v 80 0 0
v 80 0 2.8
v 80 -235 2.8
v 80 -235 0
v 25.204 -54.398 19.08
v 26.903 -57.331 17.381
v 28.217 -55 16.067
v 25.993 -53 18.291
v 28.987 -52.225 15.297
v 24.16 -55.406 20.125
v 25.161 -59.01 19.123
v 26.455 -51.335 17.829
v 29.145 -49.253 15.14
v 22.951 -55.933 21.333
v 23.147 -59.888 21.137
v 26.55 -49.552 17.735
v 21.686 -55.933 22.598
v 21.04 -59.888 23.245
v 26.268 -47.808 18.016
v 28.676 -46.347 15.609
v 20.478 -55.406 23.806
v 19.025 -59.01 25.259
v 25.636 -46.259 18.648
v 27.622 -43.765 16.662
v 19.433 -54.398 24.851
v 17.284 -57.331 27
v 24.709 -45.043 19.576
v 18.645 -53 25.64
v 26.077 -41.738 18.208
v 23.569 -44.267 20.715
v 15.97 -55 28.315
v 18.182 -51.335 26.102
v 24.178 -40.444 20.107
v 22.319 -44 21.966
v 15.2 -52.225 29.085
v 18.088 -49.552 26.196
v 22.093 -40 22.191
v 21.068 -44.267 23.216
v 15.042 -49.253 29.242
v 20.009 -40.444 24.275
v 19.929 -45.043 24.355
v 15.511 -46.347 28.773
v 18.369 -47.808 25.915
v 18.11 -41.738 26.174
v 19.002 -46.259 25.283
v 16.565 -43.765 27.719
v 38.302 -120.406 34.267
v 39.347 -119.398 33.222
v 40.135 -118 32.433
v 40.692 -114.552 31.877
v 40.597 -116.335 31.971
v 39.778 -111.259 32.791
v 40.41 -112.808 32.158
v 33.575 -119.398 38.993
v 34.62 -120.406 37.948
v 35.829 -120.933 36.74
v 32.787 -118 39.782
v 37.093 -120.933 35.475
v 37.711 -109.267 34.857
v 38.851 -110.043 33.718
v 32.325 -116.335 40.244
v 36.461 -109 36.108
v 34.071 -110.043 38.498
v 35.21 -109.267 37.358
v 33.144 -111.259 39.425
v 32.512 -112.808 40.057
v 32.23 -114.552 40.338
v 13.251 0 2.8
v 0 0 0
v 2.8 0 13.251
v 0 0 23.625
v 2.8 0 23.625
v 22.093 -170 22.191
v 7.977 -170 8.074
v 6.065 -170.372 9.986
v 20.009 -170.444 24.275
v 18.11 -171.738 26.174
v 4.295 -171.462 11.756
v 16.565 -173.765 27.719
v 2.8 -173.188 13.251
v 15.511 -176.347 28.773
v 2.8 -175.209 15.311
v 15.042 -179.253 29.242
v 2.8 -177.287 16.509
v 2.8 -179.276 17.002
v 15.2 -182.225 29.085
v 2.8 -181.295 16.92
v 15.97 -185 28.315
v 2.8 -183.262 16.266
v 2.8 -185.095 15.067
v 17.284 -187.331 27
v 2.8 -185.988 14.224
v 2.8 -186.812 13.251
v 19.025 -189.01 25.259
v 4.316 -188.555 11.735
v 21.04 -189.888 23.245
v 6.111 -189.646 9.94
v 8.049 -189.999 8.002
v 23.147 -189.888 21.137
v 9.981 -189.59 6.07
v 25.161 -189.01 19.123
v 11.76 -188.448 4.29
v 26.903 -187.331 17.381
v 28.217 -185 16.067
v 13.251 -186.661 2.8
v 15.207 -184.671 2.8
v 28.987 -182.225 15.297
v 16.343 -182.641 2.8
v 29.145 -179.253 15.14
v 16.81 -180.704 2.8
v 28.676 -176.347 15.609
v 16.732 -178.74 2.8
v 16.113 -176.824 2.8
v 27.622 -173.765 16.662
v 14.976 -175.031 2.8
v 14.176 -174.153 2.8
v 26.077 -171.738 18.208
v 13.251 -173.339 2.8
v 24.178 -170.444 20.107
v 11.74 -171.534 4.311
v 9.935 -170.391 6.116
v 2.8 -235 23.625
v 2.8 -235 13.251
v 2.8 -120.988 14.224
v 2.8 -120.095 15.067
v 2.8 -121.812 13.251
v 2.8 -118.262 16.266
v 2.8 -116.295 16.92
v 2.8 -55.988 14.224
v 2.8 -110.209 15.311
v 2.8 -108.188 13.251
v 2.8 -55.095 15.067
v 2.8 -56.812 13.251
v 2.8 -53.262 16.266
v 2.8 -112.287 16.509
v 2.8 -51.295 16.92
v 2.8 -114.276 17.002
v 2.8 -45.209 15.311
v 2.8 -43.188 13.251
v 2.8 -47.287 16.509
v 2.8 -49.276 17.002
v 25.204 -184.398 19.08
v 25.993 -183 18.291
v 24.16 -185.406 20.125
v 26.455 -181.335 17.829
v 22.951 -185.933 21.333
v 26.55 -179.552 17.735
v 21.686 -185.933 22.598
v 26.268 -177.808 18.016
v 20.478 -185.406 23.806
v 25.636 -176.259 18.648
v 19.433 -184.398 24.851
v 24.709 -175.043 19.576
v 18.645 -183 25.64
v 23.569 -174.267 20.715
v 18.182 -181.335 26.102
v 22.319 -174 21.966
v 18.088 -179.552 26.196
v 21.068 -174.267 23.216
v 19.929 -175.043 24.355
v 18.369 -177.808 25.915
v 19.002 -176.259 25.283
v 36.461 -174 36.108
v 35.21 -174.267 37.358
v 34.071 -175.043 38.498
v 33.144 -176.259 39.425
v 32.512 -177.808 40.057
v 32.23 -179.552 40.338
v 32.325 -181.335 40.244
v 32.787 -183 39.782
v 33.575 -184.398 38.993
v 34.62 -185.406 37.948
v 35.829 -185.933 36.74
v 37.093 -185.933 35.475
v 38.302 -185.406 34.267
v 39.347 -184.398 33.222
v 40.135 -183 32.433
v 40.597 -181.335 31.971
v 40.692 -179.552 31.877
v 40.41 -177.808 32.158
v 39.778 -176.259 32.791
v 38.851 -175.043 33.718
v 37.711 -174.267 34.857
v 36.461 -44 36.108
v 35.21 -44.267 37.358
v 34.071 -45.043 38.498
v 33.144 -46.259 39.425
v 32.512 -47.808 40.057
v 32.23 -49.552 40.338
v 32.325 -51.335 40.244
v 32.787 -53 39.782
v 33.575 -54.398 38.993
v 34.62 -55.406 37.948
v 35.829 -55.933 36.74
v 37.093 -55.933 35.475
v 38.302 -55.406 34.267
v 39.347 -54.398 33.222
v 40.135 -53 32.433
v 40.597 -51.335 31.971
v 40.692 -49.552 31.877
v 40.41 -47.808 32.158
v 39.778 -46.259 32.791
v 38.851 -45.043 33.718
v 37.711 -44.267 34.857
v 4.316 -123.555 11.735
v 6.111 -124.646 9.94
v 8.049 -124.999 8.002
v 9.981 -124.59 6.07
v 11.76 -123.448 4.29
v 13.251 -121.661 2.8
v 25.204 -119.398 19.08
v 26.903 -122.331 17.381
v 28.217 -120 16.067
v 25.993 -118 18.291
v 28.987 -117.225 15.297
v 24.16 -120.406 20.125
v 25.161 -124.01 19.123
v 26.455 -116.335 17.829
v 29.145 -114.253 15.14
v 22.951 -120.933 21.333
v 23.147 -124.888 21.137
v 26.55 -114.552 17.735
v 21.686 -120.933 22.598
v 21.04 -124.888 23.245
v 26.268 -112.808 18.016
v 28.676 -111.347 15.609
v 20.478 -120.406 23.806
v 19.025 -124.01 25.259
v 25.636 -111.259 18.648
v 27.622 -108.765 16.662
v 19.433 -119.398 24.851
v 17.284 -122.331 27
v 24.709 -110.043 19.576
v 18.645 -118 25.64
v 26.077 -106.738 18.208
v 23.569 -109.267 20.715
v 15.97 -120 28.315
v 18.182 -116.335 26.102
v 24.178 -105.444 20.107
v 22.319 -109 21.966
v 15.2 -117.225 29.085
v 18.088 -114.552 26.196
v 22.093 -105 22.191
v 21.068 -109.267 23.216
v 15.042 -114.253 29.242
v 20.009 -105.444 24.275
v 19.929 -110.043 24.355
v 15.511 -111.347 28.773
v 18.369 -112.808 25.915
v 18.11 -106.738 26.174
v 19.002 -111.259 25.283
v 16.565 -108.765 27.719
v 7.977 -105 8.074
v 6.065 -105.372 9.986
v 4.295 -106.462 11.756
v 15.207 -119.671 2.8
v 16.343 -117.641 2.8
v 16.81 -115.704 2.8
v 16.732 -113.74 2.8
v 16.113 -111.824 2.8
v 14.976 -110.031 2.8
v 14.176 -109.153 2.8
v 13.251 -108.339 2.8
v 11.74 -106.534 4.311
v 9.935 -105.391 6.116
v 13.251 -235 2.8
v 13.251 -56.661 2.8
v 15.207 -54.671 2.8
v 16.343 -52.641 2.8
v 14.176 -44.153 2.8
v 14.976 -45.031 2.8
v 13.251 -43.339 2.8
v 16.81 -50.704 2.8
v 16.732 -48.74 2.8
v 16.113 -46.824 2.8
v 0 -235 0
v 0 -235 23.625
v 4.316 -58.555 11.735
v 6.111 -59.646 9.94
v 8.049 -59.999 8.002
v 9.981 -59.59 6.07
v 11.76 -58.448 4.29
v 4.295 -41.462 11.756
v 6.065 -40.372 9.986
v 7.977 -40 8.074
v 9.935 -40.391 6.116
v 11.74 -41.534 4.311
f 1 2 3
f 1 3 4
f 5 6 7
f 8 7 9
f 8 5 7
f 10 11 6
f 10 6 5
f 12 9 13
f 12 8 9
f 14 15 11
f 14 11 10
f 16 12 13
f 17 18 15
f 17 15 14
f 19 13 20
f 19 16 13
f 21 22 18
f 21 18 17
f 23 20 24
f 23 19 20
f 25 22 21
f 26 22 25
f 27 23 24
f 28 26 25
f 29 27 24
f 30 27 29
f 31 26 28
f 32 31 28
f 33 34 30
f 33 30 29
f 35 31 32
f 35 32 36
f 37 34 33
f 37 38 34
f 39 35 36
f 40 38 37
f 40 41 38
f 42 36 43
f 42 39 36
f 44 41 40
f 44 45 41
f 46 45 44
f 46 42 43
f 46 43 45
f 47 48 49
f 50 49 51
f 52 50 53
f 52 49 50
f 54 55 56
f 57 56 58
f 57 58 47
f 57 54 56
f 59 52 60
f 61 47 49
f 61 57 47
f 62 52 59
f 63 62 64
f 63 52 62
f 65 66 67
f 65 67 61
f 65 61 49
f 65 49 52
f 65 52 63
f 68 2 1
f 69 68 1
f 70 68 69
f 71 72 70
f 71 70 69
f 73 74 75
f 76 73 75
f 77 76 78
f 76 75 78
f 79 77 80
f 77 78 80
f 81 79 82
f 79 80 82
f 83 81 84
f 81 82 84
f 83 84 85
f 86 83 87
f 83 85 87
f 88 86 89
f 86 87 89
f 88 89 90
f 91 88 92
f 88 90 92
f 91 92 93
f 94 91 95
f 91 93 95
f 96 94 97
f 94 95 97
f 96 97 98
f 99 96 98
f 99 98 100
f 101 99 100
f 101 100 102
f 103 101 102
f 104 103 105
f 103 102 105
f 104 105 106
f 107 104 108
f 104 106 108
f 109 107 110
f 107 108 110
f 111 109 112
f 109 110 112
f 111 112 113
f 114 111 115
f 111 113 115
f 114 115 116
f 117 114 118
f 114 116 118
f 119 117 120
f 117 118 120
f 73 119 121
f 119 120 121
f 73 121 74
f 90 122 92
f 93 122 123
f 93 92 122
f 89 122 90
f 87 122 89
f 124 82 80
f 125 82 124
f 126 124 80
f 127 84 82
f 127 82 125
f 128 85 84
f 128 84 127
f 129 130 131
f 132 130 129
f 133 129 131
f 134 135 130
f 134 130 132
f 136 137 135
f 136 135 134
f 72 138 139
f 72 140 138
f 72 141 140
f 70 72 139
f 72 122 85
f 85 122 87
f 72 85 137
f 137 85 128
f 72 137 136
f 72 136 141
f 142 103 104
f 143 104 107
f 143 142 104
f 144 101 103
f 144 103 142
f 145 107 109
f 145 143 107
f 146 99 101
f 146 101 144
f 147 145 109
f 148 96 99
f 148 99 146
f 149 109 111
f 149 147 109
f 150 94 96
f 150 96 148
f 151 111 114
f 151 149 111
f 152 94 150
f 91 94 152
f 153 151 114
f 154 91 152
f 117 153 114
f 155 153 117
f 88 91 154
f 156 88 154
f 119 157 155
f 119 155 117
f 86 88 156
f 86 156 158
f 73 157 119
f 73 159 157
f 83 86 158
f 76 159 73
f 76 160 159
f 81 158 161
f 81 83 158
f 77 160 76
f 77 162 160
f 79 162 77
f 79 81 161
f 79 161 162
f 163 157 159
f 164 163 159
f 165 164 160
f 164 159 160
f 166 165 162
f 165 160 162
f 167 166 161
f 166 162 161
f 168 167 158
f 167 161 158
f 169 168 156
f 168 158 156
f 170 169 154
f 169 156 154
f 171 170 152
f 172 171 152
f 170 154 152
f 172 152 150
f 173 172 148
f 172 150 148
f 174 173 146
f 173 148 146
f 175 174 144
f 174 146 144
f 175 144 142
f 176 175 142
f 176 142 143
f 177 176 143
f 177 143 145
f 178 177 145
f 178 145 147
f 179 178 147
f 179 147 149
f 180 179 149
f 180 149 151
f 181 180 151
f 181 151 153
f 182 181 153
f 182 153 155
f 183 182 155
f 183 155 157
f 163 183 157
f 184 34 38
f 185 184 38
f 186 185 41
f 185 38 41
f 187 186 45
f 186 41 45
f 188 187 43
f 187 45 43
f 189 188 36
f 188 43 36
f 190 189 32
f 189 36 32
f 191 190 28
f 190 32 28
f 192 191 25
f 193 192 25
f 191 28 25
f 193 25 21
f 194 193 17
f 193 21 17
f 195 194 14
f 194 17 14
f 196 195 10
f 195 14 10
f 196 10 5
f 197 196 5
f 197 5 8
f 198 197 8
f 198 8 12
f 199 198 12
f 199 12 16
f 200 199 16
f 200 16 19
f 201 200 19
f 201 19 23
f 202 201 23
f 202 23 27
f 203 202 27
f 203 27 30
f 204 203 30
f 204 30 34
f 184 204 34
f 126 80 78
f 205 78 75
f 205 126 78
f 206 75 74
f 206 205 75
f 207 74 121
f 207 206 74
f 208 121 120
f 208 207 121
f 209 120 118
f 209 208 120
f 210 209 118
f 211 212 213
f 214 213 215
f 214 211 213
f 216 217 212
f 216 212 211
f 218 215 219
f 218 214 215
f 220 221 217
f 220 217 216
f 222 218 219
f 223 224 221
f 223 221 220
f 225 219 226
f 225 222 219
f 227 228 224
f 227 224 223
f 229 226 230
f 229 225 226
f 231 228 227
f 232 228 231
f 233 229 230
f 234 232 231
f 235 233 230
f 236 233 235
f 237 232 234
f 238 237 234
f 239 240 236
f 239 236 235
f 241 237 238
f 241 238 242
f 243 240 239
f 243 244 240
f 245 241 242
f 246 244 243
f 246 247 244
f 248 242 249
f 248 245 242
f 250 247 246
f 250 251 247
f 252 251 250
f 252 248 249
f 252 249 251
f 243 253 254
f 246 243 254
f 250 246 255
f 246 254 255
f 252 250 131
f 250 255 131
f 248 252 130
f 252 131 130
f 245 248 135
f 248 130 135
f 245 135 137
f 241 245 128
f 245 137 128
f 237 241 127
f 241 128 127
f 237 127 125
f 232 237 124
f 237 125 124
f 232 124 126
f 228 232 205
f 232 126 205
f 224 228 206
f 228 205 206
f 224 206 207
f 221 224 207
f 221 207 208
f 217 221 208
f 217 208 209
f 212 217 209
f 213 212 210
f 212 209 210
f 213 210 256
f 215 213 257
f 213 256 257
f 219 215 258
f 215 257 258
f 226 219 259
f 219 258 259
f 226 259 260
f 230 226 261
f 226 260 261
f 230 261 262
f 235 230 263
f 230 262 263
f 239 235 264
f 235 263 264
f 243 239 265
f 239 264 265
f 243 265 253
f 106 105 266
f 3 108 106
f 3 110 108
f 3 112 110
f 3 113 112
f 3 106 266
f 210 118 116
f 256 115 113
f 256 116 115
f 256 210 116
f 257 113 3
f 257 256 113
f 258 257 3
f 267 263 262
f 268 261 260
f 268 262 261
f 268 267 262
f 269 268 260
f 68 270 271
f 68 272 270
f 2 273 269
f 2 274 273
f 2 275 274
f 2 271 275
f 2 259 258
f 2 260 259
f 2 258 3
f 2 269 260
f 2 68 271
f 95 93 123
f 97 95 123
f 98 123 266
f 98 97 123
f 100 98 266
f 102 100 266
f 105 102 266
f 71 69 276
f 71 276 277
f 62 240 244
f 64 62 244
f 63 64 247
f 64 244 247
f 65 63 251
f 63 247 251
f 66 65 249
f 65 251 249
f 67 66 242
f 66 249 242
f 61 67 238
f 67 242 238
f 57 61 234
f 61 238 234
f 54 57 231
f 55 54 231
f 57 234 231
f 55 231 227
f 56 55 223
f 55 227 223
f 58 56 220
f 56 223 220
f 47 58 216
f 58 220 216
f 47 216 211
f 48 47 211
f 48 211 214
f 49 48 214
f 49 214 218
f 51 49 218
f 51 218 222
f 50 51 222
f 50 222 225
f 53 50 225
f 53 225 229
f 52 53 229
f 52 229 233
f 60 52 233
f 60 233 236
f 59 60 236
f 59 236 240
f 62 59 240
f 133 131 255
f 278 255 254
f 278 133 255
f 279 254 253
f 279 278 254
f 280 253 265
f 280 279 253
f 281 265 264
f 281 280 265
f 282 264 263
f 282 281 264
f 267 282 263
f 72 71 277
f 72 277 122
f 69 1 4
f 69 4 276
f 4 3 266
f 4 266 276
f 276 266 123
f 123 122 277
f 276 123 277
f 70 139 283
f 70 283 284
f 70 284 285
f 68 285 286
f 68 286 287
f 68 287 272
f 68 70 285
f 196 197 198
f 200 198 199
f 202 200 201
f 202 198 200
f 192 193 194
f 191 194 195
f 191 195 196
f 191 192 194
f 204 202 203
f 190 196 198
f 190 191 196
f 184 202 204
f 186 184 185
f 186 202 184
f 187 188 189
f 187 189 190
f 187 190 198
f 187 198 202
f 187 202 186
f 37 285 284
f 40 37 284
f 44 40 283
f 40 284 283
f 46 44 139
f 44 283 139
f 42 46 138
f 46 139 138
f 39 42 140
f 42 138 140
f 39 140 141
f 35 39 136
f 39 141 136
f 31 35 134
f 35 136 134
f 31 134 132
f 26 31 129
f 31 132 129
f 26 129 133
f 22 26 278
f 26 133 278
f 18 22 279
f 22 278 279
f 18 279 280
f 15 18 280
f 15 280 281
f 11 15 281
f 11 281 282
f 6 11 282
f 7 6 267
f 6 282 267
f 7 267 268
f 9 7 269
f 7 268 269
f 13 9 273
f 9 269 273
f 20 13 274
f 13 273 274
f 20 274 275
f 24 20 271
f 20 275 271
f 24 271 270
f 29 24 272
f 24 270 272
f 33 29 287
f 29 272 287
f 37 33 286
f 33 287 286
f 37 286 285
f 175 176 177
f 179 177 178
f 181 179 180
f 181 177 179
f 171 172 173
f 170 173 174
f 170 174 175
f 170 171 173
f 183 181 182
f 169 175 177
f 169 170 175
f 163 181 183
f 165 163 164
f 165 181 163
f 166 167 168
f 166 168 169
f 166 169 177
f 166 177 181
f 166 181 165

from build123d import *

# Parameters (mm, degrees)
PAD_DEPTH           = 235
SKETCH001_R         = 6
PAD001_DEPTH        = 40
SKETCH002_R         = 10
PAD002_DEPTH        = 20
LINEARPATTERN_COUNT = 3
LINEARPATTERN_PITCH = 65


with BuildPart() as part:
    # Sketch → Pad (new body)
    with BuildSketch(Plane.XZ):
        Polygon((0, 23.625182), (2.8, 23.625182), (2.8, 13.250815), (13.250815, 2.8), (80, 2.8), (80, 0), (0, 0), align=None)
    extrude(amount=PAD_DEPTH)

    # Sketch001 (on DatumPlane) → Pad001 (join)
    with BuildSketch(Plane(origin=(16, 0, 0), x_dir=(0, 1, 0), z_dir=(0.707107, 0, 0.707107))):
        with Locations((-50, 11.06395)):
            Circle(SKETCH001_R)
    pad001 = extrude(amount=PAD001_DEPTH)

    # Sketch002 (on DatumPlane) → Pad002 (join)
    with BuildSketch(Plane(origin=(16, 0, 0), x_dir=(0, 1, 0), z_dir=(0.707107, 0, 0.707107))):
        with Locations((-50, 11.382573)):
            Circle(SKETCH002_R)
    pad002 = extrude(amount=PAD002_DEPTH)

    # LinearPattern: Pad001, Pad002 ×3
    with Locations(*[(0, -i * LINEARPATTERN_PITCH, 0) for i in range(1, LINEARPATTERN_COUNT)]):
        add(pad001)
        add(pad002)


solid = part.part
